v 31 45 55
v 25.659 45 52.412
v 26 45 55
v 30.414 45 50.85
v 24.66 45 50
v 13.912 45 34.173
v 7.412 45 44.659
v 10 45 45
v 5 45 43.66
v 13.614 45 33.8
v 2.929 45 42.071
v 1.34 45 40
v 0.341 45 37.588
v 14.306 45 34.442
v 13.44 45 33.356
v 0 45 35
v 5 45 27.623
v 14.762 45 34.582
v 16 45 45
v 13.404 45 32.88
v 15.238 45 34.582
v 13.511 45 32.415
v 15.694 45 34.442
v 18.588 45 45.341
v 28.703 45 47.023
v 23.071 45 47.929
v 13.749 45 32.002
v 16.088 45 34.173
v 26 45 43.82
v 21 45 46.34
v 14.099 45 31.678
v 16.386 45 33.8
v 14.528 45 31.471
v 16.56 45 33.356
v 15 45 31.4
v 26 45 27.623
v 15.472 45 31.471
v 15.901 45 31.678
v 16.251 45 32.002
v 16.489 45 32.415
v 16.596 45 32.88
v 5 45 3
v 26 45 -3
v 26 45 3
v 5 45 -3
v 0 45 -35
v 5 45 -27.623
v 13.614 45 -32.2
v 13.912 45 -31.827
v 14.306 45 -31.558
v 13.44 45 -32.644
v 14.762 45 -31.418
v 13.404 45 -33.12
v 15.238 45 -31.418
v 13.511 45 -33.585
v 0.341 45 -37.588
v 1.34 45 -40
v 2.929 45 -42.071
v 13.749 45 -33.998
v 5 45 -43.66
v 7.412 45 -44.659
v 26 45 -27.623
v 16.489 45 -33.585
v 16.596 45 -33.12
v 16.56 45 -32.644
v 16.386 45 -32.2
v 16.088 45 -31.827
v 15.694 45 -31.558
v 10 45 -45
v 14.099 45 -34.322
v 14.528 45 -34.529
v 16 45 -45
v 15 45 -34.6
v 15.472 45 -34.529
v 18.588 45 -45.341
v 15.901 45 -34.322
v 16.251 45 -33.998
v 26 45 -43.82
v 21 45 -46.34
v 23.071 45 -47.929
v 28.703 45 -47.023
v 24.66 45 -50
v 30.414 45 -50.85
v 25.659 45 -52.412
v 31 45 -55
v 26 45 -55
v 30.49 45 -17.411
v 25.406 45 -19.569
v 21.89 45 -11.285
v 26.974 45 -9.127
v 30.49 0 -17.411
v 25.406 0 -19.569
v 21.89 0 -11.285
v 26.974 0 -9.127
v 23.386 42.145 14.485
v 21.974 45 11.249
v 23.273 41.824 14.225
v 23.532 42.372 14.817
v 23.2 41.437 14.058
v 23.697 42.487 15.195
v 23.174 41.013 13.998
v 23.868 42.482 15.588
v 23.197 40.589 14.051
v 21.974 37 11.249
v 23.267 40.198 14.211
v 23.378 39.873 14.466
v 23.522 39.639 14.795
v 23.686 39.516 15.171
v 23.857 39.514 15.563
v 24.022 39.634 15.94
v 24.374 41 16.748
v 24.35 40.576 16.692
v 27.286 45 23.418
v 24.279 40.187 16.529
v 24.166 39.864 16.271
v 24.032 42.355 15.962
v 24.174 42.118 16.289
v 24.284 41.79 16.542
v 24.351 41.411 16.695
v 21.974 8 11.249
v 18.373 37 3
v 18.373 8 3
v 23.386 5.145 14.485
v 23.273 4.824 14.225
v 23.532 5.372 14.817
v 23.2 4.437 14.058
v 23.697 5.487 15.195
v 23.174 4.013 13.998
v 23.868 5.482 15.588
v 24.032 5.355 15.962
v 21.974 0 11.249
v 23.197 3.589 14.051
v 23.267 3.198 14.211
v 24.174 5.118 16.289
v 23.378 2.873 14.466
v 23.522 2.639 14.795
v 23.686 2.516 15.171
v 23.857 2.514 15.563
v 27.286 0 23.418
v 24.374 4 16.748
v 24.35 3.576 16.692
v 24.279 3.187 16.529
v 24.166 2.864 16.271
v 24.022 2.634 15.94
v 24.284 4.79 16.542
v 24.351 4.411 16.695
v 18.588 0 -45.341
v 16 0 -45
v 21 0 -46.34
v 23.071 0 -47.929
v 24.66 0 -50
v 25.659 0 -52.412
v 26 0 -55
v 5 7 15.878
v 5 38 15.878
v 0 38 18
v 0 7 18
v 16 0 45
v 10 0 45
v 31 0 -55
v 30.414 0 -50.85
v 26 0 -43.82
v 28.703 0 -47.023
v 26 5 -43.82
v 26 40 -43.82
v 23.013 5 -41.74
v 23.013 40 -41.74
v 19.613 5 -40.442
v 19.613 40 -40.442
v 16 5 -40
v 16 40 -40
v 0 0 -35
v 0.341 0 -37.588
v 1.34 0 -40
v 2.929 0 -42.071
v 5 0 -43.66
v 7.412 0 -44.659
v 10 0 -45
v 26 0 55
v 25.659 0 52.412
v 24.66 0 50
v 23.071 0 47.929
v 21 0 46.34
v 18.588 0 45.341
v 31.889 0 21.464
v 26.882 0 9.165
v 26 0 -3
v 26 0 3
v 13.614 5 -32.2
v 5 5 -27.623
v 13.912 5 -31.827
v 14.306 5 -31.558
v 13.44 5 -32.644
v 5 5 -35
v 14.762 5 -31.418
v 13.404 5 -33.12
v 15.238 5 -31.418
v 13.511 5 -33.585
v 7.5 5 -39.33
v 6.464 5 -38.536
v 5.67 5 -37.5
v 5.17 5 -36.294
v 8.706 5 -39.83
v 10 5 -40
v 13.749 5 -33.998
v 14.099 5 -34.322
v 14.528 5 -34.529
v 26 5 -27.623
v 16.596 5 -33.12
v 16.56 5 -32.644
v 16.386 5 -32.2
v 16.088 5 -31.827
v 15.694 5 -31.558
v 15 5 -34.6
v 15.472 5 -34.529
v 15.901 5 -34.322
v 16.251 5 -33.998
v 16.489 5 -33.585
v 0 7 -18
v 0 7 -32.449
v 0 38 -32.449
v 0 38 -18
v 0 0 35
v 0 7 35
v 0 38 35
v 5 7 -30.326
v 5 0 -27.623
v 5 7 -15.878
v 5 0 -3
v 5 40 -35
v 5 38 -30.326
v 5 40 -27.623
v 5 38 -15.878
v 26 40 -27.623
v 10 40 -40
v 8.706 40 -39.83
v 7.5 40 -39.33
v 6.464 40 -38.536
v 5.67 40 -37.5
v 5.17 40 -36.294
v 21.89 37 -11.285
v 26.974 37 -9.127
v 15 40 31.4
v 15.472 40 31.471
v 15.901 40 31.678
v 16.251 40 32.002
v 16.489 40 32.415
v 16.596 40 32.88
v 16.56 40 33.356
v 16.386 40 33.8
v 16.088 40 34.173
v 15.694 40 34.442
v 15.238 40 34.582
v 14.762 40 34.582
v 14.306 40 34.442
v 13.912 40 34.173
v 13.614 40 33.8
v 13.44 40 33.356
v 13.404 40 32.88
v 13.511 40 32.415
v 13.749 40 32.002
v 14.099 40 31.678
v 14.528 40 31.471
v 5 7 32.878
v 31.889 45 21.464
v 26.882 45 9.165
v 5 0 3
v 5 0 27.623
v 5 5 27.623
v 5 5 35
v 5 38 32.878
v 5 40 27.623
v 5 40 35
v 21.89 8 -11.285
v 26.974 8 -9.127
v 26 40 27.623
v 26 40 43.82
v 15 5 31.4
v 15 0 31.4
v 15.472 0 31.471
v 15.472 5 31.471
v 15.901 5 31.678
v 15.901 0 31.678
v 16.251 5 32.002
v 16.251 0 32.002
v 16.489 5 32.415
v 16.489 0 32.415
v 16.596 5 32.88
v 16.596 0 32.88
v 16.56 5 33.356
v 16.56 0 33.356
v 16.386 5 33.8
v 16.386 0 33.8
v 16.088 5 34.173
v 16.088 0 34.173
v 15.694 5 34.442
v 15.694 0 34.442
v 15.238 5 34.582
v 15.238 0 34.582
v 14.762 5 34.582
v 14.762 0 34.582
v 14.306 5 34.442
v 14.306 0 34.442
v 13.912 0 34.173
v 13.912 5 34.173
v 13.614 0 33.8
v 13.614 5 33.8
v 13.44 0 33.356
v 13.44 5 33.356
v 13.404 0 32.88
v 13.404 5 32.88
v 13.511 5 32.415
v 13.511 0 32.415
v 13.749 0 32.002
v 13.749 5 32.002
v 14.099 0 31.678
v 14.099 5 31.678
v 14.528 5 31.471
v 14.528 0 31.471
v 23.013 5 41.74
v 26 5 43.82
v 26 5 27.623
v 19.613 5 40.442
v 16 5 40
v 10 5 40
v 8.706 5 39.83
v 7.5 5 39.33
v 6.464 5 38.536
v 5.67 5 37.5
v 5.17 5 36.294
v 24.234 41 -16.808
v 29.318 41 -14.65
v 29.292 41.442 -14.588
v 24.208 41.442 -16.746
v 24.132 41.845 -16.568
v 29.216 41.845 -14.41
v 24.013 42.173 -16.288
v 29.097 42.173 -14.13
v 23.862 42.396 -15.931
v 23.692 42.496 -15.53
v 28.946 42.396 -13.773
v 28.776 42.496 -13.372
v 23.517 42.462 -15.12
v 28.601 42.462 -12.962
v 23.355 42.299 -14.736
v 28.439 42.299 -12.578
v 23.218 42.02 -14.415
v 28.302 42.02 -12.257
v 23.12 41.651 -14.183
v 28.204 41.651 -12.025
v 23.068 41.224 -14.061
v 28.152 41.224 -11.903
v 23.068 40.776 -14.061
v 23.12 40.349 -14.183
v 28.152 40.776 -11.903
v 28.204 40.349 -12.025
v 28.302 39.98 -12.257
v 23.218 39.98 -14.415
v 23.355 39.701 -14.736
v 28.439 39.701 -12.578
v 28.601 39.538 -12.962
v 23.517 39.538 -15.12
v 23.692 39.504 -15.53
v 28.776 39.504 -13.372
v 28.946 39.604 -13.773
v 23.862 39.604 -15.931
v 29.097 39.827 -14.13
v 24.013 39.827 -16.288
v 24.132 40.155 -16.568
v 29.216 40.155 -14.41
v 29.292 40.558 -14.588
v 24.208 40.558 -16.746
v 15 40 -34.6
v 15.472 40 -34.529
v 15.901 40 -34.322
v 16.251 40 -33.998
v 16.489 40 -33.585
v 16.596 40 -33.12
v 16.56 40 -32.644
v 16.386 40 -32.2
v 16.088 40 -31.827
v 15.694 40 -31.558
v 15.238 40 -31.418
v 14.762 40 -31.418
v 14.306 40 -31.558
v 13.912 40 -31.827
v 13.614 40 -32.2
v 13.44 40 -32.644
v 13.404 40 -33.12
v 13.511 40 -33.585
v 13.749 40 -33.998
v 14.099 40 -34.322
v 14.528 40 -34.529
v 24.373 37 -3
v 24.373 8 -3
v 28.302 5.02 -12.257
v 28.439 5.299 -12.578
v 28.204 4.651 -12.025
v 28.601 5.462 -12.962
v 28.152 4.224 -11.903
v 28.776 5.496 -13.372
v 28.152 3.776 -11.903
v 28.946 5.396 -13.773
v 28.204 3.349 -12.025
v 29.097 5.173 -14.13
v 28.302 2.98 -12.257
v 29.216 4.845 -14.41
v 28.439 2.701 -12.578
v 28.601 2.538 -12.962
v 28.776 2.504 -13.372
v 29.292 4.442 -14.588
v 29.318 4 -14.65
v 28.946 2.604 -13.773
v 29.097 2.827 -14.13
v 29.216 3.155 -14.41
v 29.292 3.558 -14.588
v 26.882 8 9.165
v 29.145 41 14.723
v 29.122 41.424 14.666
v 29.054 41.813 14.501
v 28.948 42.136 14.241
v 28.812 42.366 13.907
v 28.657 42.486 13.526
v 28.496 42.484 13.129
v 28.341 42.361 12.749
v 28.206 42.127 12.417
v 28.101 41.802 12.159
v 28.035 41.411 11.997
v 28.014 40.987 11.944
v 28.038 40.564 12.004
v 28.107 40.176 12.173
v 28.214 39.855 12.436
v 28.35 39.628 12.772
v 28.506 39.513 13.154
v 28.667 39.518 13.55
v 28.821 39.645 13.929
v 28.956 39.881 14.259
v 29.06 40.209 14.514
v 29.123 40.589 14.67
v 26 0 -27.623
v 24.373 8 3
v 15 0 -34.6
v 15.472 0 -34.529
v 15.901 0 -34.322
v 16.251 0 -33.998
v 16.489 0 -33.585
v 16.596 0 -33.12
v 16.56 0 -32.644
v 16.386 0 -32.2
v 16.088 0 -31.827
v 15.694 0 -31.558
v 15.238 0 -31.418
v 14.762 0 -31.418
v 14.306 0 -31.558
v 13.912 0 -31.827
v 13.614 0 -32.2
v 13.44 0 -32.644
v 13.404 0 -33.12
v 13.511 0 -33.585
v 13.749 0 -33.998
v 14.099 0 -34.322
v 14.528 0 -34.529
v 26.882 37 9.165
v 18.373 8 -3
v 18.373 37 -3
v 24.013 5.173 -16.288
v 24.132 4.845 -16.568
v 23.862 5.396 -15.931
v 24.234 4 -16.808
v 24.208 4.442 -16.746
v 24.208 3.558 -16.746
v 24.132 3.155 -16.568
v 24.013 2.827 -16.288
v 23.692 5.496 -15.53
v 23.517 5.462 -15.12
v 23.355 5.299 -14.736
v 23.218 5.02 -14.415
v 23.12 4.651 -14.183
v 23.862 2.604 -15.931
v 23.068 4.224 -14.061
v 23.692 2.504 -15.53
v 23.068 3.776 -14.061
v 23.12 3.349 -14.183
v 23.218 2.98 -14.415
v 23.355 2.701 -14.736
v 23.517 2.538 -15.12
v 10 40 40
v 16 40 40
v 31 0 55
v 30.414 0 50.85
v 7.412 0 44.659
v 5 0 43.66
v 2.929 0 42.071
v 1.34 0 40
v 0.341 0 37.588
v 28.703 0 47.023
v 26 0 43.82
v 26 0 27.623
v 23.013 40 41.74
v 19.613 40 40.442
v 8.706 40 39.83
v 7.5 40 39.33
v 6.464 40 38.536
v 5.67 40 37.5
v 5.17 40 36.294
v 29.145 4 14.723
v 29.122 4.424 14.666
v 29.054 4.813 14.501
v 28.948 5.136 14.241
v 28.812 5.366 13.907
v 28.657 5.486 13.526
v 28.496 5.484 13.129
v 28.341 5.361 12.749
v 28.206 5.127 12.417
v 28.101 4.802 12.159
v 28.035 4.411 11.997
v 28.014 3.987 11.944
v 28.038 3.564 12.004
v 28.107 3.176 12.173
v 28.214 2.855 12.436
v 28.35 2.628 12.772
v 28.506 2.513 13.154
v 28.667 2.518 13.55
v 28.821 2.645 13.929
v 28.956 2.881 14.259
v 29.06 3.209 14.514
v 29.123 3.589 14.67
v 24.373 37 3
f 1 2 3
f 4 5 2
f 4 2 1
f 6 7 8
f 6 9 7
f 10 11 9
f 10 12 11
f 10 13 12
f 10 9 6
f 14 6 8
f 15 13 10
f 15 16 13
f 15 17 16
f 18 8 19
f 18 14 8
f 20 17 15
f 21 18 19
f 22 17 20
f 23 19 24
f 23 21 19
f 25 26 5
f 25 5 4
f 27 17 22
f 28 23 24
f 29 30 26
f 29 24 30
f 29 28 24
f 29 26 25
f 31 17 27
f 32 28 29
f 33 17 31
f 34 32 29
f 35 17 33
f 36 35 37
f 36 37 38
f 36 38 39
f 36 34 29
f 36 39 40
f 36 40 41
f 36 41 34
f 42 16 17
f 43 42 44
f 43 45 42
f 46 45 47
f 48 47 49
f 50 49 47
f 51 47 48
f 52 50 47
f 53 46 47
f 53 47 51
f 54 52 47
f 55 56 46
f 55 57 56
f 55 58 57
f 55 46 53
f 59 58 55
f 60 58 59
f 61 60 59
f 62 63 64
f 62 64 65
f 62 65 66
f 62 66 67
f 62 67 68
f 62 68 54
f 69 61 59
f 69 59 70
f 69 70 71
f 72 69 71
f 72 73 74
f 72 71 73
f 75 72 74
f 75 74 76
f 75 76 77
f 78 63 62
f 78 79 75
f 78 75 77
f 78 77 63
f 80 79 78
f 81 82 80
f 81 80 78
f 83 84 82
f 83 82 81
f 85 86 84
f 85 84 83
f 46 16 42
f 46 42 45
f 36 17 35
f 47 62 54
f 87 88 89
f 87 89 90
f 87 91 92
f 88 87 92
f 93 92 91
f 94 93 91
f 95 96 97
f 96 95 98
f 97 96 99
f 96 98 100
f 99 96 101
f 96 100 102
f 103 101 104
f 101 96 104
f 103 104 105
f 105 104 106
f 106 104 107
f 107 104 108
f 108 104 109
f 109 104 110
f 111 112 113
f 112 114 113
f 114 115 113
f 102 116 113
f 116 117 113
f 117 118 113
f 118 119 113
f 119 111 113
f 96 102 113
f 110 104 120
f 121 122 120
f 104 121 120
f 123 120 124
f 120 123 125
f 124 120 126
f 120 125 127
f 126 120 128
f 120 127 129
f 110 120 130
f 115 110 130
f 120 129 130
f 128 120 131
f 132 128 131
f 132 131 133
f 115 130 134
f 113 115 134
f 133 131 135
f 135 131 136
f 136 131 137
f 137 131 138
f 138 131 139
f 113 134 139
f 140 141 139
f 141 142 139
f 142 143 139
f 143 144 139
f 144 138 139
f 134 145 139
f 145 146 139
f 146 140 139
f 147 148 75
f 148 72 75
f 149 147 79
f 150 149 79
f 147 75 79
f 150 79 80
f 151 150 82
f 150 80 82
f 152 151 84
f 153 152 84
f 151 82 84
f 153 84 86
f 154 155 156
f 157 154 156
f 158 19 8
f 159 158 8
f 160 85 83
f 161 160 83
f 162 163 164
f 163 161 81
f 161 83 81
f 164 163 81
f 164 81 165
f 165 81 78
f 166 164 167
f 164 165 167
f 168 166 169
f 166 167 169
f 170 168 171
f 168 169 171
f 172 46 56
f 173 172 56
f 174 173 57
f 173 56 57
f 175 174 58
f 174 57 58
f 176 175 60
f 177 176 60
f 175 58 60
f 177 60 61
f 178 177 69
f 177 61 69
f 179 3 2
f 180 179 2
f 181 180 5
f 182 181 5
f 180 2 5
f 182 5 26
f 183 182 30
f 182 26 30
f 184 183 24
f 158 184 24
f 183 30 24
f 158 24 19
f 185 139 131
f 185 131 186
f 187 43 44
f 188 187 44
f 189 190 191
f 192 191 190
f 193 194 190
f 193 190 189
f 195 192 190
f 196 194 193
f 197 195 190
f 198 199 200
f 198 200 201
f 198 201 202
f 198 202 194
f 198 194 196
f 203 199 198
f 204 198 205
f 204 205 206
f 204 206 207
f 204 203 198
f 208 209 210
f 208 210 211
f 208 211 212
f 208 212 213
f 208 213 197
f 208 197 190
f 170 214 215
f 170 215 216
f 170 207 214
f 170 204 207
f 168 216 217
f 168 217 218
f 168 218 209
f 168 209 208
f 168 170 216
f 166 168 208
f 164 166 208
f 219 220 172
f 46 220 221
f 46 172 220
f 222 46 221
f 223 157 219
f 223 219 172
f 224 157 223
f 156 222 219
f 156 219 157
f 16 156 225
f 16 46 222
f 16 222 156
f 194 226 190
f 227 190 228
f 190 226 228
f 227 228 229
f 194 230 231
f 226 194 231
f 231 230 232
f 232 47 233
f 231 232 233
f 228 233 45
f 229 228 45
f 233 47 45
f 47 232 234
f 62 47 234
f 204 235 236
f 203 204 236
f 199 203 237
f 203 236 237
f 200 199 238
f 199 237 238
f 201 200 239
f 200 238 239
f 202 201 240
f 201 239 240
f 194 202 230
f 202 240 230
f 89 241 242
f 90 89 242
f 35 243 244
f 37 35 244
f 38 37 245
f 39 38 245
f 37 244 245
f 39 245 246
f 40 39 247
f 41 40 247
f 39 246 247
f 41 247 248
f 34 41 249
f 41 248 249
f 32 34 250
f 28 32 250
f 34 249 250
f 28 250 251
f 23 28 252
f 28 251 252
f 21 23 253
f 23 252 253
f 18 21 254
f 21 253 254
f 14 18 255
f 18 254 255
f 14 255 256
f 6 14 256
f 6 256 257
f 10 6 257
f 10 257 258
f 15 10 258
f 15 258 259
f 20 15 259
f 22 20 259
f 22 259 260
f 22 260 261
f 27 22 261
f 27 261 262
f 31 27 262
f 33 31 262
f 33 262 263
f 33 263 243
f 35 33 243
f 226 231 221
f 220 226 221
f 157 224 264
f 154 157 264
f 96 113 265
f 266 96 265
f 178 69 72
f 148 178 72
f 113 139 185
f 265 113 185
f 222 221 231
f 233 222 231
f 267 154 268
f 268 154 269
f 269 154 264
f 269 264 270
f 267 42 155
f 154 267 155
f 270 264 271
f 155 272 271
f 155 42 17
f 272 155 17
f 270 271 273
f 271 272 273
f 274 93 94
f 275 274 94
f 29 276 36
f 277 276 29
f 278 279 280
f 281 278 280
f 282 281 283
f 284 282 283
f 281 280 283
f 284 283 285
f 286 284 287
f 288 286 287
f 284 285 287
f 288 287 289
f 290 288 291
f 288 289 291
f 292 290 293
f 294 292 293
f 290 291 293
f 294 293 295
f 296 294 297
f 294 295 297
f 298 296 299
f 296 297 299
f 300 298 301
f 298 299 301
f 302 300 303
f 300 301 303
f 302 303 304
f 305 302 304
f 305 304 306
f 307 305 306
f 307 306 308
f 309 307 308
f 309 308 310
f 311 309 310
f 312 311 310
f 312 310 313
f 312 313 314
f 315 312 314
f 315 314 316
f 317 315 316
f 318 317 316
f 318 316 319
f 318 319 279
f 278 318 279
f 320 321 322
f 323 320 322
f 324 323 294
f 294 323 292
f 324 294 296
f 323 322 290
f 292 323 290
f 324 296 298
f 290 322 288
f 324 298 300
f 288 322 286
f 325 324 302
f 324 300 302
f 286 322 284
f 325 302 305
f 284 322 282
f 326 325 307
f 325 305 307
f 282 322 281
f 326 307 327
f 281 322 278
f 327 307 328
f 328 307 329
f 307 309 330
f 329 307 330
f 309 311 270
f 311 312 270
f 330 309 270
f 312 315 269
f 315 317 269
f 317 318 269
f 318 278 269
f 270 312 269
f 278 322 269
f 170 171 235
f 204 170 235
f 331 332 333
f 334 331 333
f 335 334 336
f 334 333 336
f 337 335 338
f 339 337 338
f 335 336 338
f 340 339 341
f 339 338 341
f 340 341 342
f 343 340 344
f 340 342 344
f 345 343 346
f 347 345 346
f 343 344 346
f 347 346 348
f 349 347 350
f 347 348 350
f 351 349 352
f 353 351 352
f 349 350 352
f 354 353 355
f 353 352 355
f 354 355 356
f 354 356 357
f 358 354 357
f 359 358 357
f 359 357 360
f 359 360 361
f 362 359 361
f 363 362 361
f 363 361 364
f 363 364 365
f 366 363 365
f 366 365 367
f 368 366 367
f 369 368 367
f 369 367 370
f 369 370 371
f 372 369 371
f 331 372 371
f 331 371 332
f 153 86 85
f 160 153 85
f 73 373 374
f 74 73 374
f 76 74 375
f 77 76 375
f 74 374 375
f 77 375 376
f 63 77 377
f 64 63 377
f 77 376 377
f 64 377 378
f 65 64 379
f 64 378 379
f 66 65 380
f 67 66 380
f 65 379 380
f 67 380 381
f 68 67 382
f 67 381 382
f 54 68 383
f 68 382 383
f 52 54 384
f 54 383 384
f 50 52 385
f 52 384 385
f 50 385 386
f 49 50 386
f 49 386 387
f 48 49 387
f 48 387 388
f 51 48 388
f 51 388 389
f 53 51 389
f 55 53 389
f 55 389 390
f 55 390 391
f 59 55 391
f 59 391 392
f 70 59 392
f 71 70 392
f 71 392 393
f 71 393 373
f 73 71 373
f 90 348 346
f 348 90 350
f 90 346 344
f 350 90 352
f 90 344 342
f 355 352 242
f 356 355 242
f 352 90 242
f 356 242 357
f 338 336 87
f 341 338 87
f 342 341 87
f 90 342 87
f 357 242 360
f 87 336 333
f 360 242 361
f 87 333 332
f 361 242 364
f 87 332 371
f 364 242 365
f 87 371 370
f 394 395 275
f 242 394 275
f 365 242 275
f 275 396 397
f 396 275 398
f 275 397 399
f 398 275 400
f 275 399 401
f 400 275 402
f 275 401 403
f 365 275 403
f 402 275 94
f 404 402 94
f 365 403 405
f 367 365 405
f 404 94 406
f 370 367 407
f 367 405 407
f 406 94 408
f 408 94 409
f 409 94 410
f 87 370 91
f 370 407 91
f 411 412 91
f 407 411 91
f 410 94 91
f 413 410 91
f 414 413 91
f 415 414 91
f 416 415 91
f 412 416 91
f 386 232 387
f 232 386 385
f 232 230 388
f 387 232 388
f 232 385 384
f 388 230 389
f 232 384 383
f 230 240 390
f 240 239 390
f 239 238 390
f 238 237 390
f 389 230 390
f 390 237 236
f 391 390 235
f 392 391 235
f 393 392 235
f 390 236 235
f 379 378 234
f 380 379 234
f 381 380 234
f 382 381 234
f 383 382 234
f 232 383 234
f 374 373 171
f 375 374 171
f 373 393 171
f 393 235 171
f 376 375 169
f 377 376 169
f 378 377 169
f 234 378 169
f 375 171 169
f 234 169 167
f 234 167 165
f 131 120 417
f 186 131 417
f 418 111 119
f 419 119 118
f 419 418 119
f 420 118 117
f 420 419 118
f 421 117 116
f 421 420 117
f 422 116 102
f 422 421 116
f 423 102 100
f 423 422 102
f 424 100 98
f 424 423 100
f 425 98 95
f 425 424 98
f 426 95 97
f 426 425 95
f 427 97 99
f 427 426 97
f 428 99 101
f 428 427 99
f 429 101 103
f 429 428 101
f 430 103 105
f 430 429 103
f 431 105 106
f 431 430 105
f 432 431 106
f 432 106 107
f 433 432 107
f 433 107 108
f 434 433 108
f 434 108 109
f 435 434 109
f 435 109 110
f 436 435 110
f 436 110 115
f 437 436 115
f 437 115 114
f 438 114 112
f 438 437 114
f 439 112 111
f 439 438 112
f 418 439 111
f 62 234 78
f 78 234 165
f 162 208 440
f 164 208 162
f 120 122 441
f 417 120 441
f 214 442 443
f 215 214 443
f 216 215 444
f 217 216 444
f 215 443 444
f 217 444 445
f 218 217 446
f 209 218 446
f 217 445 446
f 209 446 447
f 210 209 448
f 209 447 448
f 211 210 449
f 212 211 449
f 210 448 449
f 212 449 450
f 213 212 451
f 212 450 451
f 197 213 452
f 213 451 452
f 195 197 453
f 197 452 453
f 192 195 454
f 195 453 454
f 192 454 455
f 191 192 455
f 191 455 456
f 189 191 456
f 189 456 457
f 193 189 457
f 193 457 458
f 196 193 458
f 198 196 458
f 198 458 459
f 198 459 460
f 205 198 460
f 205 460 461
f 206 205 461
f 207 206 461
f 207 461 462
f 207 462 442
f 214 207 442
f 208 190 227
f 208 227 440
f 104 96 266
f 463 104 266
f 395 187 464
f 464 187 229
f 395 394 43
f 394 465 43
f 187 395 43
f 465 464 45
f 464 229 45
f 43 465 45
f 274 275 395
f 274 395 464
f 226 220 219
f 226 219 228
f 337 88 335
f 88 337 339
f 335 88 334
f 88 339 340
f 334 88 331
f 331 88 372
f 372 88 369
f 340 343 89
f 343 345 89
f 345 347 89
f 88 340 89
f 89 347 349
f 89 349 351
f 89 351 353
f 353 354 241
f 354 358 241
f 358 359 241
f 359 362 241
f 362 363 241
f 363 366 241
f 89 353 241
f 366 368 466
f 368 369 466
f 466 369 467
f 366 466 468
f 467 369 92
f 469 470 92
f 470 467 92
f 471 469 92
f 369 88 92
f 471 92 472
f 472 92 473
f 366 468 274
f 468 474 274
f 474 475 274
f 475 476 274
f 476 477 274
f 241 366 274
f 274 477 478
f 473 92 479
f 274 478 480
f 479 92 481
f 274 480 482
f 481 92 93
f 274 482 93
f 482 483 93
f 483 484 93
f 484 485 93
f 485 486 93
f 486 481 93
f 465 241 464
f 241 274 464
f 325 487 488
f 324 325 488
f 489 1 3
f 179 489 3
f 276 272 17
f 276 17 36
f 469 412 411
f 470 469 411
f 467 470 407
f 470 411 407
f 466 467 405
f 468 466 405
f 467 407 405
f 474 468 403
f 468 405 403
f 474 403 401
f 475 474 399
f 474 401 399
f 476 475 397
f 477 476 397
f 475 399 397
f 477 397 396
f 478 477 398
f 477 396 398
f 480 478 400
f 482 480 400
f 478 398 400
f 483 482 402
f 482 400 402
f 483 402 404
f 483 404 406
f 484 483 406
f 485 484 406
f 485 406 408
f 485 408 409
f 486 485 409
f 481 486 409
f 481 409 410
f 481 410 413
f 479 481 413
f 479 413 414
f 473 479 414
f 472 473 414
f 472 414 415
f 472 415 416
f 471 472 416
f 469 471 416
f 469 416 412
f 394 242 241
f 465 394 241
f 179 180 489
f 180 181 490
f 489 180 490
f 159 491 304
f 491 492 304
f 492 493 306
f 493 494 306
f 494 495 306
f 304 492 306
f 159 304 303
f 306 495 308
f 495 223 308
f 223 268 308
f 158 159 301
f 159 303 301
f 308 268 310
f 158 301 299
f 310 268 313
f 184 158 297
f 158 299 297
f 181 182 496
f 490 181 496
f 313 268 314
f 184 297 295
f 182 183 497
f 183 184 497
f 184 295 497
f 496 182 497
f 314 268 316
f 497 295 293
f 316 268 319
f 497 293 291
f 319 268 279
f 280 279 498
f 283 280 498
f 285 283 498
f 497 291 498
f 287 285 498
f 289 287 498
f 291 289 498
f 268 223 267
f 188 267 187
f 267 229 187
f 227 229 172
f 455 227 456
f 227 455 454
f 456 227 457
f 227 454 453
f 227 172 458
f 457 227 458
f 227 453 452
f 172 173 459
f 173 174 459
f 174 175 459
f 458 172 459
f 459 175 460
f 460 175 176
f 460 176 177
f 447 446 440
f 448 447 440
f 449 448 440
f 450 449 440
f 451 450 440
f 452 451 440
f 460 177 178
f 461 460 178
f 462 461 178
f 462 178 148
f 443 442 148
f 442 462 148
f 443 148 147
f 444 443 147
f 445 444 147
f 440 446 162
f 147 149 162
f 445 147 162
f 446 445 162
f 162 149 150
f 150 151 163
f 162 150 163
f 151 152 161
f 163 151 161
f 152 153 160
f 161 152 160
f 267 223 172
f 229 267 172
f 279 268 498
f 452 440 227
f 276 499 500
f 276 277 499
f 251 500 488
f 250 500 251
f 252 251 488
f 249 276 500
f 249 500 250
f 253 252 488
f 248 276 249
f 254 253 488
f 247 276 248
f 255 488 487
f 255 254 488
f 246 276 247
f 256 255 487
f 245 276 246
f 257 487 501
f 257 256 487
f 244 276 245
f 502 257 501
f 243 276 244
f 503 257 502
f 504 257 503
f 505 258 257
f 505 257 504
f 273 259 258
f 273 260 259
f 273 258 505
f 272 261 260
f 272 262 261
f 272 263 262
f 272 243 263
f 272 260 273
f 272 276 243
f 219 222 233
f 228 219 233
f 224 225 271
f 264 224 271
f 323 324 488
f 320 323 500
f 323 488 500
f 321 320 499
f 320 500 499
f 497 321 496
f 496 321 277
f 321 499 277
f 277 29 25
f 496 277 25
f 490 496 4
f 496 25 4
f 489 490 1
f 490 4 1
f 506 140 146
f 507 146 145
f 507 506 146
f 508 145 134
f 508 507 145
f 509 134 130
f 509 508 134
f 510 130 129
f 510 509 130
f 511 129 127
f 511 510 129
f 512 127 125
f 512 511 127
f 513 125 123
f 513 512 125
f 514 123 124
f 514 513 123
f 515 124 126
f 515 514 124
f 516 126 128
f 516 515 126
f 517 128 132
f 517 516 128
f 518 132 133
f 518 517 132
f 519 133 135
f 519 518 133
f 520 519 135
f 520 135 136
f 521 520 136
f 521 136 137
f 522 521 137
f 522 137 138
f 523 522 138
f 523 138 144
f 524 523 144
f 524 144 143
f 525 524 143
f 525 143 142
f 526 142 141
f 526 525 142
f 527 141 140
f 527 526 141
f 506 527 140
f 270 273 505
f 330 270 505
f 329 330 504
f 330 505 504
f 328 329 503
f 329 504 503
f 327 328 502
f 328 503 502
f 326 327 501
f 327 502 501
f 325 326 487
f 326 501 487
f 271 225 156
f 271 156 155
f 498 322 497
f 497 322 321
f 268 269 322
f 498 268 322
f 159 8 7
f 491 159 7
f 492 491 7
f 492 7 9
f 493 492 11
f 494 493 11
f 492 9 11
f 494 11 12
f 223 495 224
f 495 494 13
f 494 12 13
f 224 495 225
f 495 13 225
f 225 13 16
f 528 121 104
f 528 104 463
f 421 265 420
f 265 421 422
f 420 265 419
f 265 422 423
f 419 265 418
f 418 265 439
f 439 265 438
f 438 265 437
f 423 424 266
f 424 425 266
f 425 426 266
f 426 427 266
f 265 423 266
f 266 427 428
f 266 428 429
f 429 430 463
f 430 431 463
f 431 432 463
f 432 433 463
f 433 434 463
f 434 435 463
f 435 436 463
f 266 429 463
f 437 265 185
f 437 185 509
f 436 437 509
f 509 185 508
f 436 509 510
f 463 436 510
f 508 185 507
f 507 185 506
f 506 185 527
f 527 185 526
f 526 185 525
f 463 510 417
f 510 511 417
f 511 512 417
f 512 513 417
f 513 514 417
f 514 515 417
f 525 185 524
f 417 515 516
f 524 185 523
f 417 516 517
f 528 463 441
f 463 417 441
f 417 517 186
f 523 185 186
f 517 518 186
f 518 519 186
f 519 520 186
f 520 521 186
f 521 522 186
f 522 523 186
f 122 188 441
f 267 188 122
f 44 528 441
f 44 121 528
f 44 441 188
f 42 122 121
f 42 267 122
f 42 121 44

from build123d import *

# Parameters (mm, degrees)
EXTRUDE_1_DEPTH     = 45
EXTRUDE_START       = -5
EXTRUDE_2_DEPTH     = 5
SKETCH_4_W          = 56.099400369
SKETCH_4_H          = 117.099049564
CUT_EXTRUDE_1_DEPTH = 68.024249343
SKETCH_8_R          = 1.6
CUT_EXTRUDE_3_DEPTH = 78.530639105
SKETCH_10_W         = 6
SKETCH_10_H         = 45
EXTRUDE_5_DEPTH     = 26
CUT_EXTRUDE_4_DEPTH = 31
EXTRUDE_6_DEPTH     = 45
CUT_EXTRUDE_6_DEPTH = 8
CUT_EXTRUDE_7_REACH = 82.1
SKETCH_19_R         = 1.5


with BuildPart() as part:
    # 草图1 → 凸台-拉伸1 (new body)
    with BuildSketch(Plane(origin=(0, 0, 0), x_dir=(1, 0, 0), z_dir=(0, 1, 0))):
        with BuildLine():
            Line((26, 55), (31, 55))
            ThreePointArc((31, 55), (26.606601718, 44.393398282), (16, 40))
            Line((16, 40), (10, 40))
            ThreePointArc((10, 40), (6.464466094, 38.535533906), (5, 35))
            Line((5, 35), (5, -35))
            ThreePointArc((5, -35), (6.464466094, -38.535533906), (10, -40))
            Line((10, -40), (16, -40))
            ThreePointArc((16, -40), (26.606601718, -44.393398282), (31, -55))
            Line((31, -55), (26, -55))
            ThreePointArc((26, -55), (23.071067812, -47.928932188), (16, -45))
            Line((16, -45), (10, -45))
            ThreePointArc((10, -45), (2.928932188, -42.071067812), (0, -35))
            Line((0, -35), (0, 35))
            ThreePointArc((0, 35), (2.928932188, 42.071067812), (10, 45))
            Line((10, 45), (16, 45))
            ThreePointArc((16, 45), (23.071067812, 47.928932188), (26, 55))
        make_face()
    extrude_1 = extrude(amount=EXTRUDE_1_DEPTH)

    # 草图3 → 凸台-拉伸2 (add)
    with BuildSketch(Plane(origin=(0, 45, 0), x_dir=(1, 0, 0), z_dir=(0, 1, 0)).offset(EXTRUDE_START)):
        with BuildLine():
            Line((5, 27.623228275), (26, 27.623228275))
            Line((26, 27.623228275), (26, 55))
            ThreePointArc((26, 55), (23.071067812, 47.928932188), (16, 45))
            Line((16, 45), (10, 45))
            ThreePointArc((10, 45), (2.928932188, 42.071067812), (0, 35))
            Line((0, 35), (0, 27.623228275))
            Line((0, 27.623228275), (5, 27.623228275))
        make_face()
        with BuildLine():
            Line((0, -27.623228275), (5, -27.623228275))
            Line((5, -27.623228275), (26, -27.623228275))
            Line((26, -27.623228275), (26, -55))
            ThreePointArc((26, -55), (23.071067812, -47.928932188), (16, -45))
            Line((16, -45), (10, -45))
            ThreePointArc((10, -45), (2.928932188, -42.071067812), (0, -35))
            Line((0, -35), (0, -27.623228275))
        make_face()
    extrude_2 = extrude(amount=EXTRUDE_2_DEPTH)

    # 草图4 → 切除-拉伸1 (cut, through all)
    with BuildSketch(Plane(origin=(0, 22.5, 0), x_dir=(-1, 0, 0), z_dir=(0, -1, 0))):
        with Locations((-12.373979196, 0.253461146)):
            Rectangle(SKETCH_4_W, SKETCH_4_H)
    extrude(amount=CUT_EXTRUDE_1_DEPTH, mode=Mode.SUBTRACT)

    # 镜向5: 凸台-拉伸1, 凸台-拉伸2 across plane
    add(extrude_1.mirror(Plane.ZX.offset(22.5)))
    add(extrude_2.mirror(Plane.ZX.offset(22.5)))

    # 草图8 → 切除-拉伸3 (cut, through all)
    with BuildSketch(Plane(origin=(0, 0, 0), x_dir=(-1, 0, 0), z_dir=(0, -1, 0))):
        with Locations(Location((-15, 33, 0), (0, 0, 90))):
            Circle(SKETCH_8_R)
        with Locations(Location((-15, -33, 0), (0, 0, 90))):
            Circle(SKETCH_8_R)
    extrude(amount=-CUT_EXTRUDE_3_DEPTH, mode=Mode.SUBTRACT)

    # 草图10 → 凸台-拉伸5 (add)
    with BuildSketch(Plane.ZY):
        with Locations((0, 22.5)):
            Rectangle(SKETCH_10_W, SKETCH_10_H)
    extrude(amount=-EXTRUDE_5_DEPTH)

    # Sketch 2198 → 切除-拉伸4 (cut)
    with BuildSketch(Plane(origin=(0, 38, 0), x_dir=(1, 0, 0), z_dir=(0, 1, 0))):
        Polygon((0, -18), (0, -35), (21.171611629, -26.013184045), (21.171611629, -9.013184045), align=None)
        Polygon((0, 32.448593019), (0, 18), (15.97488762, 11.219062513), (21.171611629, 23.461777064), align=None)
    extrude(amount=-CUT_EXTRUDE_4_DEPTH, mode=Mode.SUBTRACT)

    # 草图15 → 凸台-拉伸6 (add)
    with BuildSketch(Plane(origin=(0, 0, 0), x_dir=(-1, 0, 0), z_dir=(0, -1, 0))):
        Polygon((-18.373024886, 3), (-24.373024886, 3), (-30.49016031, 17.411067961), (-25.406185199, 19.569087362), align=None)
        Polygon((-31.8885242, -21.464124551), (-24.373024886, -3), (-18.373024886, -3), (-27.285999932, -23.417780194), align=None)
    extrude(amount=-EXTRUDE_6_DEPTH)

    # 草图16 → 切除-拉伸6 (cut)
    with BuildSketch(Plane(origin=(0, 0, 0), x_dir=(-1, 0, 0), z_dir=(0, -1, 0))):
        Polygon((-24.373024886, -3), (-18.373024886, -3), (-21.889605043, -11.284543681), (-26.973580154, -9.12652428), align=None)
        Polygon((-18.373024886, 3), (-21.889605043, 11.284543681), (-26.973580154, 9.12652428), (-24.373024886, 3), align=None)
    cut_extrude_6 = extrude(amount=-CUT_EXTRUDE_6_DEPTH, mode=Mode.SUBTRACT)

    # 镜向6: 切除-拉伸6 across plane
    add(cut_extrude_6.mirror(Plane(origin=(0, 22.5, 0), x_dir=(0, 0, 1), z_dir=(0, -1, 0))), mode=Mode.SUBTRACT)

    # 草图19 → 切除-拉伸7 (cut, up to next)
    with BuildSketch(Plane(origin=(19.572965618, 0, 8.308230983), x_dir=(0.39073112848926966, 0, -0.9205048534524422), z_dir=(0.9205048534524422, 0, 0.39073112848926966)), mode=Mode.PRIVATE) as cut_extrude_7_sk1:
        with Locations((23.440427308, 41)):
            Circle(SKETCH_19_R)
    cut_extrude_7_tool1 = extrude(cut_extrude_7_sk1.sketch, amount=-CUT_EXTRUDE_7_REACH, mode=Mode.PRIVATE) & part.part
    # 草图19 → 切除-拉伸7 (cut, up to next)
    with BuildSketch(Plane(origin=(19.572965618, 0, 8.308230983), x_dir=(0.39073112848926966, 0, -0.9205048534524422), z_dir=(0.9205048534524422, 0, 0.39073112848926966)), mode=Mode.PRIVATE) as cut_extrude_7_sk2:
        with Locations((23.440427308, 4)):
            Circle(SKETCH_19_R)
    cut_extrude_7_tool2 = extrude(cut_extrude_7_sk2.sketch, amount=-CUT_EXTRUDE_7_REACH, mode=Mode.PRIVATE) & part.part
    cut_extrude_7_1 = cut_extrude_7_tool1.solids().sort_by_distance((28.73187, 41, -13.268796))[0]
    add(cut_extrude_7_1, mode=Mode.SUBTRACT)
    cut_extrude_7_2 = cut_extrude_7_tool2.solids().sort_by_distance((28.73187, 4, -13.268796))[0]
    add(cut_extrude_7_2, mode=Mode.SUBTRACT)
    cut_extrude_7 = cut_extrude_7_1 + cut_extrude_7_2  # 切除-拉伸7 as one shape, for the pattern or mirror that repeats it

    # 镜向7: 切除-拉伸7 across plane
    add(cut_extrude_7.mirror(Plane.XY), mode=Mode.SUBTRACT)


solid = part.part
